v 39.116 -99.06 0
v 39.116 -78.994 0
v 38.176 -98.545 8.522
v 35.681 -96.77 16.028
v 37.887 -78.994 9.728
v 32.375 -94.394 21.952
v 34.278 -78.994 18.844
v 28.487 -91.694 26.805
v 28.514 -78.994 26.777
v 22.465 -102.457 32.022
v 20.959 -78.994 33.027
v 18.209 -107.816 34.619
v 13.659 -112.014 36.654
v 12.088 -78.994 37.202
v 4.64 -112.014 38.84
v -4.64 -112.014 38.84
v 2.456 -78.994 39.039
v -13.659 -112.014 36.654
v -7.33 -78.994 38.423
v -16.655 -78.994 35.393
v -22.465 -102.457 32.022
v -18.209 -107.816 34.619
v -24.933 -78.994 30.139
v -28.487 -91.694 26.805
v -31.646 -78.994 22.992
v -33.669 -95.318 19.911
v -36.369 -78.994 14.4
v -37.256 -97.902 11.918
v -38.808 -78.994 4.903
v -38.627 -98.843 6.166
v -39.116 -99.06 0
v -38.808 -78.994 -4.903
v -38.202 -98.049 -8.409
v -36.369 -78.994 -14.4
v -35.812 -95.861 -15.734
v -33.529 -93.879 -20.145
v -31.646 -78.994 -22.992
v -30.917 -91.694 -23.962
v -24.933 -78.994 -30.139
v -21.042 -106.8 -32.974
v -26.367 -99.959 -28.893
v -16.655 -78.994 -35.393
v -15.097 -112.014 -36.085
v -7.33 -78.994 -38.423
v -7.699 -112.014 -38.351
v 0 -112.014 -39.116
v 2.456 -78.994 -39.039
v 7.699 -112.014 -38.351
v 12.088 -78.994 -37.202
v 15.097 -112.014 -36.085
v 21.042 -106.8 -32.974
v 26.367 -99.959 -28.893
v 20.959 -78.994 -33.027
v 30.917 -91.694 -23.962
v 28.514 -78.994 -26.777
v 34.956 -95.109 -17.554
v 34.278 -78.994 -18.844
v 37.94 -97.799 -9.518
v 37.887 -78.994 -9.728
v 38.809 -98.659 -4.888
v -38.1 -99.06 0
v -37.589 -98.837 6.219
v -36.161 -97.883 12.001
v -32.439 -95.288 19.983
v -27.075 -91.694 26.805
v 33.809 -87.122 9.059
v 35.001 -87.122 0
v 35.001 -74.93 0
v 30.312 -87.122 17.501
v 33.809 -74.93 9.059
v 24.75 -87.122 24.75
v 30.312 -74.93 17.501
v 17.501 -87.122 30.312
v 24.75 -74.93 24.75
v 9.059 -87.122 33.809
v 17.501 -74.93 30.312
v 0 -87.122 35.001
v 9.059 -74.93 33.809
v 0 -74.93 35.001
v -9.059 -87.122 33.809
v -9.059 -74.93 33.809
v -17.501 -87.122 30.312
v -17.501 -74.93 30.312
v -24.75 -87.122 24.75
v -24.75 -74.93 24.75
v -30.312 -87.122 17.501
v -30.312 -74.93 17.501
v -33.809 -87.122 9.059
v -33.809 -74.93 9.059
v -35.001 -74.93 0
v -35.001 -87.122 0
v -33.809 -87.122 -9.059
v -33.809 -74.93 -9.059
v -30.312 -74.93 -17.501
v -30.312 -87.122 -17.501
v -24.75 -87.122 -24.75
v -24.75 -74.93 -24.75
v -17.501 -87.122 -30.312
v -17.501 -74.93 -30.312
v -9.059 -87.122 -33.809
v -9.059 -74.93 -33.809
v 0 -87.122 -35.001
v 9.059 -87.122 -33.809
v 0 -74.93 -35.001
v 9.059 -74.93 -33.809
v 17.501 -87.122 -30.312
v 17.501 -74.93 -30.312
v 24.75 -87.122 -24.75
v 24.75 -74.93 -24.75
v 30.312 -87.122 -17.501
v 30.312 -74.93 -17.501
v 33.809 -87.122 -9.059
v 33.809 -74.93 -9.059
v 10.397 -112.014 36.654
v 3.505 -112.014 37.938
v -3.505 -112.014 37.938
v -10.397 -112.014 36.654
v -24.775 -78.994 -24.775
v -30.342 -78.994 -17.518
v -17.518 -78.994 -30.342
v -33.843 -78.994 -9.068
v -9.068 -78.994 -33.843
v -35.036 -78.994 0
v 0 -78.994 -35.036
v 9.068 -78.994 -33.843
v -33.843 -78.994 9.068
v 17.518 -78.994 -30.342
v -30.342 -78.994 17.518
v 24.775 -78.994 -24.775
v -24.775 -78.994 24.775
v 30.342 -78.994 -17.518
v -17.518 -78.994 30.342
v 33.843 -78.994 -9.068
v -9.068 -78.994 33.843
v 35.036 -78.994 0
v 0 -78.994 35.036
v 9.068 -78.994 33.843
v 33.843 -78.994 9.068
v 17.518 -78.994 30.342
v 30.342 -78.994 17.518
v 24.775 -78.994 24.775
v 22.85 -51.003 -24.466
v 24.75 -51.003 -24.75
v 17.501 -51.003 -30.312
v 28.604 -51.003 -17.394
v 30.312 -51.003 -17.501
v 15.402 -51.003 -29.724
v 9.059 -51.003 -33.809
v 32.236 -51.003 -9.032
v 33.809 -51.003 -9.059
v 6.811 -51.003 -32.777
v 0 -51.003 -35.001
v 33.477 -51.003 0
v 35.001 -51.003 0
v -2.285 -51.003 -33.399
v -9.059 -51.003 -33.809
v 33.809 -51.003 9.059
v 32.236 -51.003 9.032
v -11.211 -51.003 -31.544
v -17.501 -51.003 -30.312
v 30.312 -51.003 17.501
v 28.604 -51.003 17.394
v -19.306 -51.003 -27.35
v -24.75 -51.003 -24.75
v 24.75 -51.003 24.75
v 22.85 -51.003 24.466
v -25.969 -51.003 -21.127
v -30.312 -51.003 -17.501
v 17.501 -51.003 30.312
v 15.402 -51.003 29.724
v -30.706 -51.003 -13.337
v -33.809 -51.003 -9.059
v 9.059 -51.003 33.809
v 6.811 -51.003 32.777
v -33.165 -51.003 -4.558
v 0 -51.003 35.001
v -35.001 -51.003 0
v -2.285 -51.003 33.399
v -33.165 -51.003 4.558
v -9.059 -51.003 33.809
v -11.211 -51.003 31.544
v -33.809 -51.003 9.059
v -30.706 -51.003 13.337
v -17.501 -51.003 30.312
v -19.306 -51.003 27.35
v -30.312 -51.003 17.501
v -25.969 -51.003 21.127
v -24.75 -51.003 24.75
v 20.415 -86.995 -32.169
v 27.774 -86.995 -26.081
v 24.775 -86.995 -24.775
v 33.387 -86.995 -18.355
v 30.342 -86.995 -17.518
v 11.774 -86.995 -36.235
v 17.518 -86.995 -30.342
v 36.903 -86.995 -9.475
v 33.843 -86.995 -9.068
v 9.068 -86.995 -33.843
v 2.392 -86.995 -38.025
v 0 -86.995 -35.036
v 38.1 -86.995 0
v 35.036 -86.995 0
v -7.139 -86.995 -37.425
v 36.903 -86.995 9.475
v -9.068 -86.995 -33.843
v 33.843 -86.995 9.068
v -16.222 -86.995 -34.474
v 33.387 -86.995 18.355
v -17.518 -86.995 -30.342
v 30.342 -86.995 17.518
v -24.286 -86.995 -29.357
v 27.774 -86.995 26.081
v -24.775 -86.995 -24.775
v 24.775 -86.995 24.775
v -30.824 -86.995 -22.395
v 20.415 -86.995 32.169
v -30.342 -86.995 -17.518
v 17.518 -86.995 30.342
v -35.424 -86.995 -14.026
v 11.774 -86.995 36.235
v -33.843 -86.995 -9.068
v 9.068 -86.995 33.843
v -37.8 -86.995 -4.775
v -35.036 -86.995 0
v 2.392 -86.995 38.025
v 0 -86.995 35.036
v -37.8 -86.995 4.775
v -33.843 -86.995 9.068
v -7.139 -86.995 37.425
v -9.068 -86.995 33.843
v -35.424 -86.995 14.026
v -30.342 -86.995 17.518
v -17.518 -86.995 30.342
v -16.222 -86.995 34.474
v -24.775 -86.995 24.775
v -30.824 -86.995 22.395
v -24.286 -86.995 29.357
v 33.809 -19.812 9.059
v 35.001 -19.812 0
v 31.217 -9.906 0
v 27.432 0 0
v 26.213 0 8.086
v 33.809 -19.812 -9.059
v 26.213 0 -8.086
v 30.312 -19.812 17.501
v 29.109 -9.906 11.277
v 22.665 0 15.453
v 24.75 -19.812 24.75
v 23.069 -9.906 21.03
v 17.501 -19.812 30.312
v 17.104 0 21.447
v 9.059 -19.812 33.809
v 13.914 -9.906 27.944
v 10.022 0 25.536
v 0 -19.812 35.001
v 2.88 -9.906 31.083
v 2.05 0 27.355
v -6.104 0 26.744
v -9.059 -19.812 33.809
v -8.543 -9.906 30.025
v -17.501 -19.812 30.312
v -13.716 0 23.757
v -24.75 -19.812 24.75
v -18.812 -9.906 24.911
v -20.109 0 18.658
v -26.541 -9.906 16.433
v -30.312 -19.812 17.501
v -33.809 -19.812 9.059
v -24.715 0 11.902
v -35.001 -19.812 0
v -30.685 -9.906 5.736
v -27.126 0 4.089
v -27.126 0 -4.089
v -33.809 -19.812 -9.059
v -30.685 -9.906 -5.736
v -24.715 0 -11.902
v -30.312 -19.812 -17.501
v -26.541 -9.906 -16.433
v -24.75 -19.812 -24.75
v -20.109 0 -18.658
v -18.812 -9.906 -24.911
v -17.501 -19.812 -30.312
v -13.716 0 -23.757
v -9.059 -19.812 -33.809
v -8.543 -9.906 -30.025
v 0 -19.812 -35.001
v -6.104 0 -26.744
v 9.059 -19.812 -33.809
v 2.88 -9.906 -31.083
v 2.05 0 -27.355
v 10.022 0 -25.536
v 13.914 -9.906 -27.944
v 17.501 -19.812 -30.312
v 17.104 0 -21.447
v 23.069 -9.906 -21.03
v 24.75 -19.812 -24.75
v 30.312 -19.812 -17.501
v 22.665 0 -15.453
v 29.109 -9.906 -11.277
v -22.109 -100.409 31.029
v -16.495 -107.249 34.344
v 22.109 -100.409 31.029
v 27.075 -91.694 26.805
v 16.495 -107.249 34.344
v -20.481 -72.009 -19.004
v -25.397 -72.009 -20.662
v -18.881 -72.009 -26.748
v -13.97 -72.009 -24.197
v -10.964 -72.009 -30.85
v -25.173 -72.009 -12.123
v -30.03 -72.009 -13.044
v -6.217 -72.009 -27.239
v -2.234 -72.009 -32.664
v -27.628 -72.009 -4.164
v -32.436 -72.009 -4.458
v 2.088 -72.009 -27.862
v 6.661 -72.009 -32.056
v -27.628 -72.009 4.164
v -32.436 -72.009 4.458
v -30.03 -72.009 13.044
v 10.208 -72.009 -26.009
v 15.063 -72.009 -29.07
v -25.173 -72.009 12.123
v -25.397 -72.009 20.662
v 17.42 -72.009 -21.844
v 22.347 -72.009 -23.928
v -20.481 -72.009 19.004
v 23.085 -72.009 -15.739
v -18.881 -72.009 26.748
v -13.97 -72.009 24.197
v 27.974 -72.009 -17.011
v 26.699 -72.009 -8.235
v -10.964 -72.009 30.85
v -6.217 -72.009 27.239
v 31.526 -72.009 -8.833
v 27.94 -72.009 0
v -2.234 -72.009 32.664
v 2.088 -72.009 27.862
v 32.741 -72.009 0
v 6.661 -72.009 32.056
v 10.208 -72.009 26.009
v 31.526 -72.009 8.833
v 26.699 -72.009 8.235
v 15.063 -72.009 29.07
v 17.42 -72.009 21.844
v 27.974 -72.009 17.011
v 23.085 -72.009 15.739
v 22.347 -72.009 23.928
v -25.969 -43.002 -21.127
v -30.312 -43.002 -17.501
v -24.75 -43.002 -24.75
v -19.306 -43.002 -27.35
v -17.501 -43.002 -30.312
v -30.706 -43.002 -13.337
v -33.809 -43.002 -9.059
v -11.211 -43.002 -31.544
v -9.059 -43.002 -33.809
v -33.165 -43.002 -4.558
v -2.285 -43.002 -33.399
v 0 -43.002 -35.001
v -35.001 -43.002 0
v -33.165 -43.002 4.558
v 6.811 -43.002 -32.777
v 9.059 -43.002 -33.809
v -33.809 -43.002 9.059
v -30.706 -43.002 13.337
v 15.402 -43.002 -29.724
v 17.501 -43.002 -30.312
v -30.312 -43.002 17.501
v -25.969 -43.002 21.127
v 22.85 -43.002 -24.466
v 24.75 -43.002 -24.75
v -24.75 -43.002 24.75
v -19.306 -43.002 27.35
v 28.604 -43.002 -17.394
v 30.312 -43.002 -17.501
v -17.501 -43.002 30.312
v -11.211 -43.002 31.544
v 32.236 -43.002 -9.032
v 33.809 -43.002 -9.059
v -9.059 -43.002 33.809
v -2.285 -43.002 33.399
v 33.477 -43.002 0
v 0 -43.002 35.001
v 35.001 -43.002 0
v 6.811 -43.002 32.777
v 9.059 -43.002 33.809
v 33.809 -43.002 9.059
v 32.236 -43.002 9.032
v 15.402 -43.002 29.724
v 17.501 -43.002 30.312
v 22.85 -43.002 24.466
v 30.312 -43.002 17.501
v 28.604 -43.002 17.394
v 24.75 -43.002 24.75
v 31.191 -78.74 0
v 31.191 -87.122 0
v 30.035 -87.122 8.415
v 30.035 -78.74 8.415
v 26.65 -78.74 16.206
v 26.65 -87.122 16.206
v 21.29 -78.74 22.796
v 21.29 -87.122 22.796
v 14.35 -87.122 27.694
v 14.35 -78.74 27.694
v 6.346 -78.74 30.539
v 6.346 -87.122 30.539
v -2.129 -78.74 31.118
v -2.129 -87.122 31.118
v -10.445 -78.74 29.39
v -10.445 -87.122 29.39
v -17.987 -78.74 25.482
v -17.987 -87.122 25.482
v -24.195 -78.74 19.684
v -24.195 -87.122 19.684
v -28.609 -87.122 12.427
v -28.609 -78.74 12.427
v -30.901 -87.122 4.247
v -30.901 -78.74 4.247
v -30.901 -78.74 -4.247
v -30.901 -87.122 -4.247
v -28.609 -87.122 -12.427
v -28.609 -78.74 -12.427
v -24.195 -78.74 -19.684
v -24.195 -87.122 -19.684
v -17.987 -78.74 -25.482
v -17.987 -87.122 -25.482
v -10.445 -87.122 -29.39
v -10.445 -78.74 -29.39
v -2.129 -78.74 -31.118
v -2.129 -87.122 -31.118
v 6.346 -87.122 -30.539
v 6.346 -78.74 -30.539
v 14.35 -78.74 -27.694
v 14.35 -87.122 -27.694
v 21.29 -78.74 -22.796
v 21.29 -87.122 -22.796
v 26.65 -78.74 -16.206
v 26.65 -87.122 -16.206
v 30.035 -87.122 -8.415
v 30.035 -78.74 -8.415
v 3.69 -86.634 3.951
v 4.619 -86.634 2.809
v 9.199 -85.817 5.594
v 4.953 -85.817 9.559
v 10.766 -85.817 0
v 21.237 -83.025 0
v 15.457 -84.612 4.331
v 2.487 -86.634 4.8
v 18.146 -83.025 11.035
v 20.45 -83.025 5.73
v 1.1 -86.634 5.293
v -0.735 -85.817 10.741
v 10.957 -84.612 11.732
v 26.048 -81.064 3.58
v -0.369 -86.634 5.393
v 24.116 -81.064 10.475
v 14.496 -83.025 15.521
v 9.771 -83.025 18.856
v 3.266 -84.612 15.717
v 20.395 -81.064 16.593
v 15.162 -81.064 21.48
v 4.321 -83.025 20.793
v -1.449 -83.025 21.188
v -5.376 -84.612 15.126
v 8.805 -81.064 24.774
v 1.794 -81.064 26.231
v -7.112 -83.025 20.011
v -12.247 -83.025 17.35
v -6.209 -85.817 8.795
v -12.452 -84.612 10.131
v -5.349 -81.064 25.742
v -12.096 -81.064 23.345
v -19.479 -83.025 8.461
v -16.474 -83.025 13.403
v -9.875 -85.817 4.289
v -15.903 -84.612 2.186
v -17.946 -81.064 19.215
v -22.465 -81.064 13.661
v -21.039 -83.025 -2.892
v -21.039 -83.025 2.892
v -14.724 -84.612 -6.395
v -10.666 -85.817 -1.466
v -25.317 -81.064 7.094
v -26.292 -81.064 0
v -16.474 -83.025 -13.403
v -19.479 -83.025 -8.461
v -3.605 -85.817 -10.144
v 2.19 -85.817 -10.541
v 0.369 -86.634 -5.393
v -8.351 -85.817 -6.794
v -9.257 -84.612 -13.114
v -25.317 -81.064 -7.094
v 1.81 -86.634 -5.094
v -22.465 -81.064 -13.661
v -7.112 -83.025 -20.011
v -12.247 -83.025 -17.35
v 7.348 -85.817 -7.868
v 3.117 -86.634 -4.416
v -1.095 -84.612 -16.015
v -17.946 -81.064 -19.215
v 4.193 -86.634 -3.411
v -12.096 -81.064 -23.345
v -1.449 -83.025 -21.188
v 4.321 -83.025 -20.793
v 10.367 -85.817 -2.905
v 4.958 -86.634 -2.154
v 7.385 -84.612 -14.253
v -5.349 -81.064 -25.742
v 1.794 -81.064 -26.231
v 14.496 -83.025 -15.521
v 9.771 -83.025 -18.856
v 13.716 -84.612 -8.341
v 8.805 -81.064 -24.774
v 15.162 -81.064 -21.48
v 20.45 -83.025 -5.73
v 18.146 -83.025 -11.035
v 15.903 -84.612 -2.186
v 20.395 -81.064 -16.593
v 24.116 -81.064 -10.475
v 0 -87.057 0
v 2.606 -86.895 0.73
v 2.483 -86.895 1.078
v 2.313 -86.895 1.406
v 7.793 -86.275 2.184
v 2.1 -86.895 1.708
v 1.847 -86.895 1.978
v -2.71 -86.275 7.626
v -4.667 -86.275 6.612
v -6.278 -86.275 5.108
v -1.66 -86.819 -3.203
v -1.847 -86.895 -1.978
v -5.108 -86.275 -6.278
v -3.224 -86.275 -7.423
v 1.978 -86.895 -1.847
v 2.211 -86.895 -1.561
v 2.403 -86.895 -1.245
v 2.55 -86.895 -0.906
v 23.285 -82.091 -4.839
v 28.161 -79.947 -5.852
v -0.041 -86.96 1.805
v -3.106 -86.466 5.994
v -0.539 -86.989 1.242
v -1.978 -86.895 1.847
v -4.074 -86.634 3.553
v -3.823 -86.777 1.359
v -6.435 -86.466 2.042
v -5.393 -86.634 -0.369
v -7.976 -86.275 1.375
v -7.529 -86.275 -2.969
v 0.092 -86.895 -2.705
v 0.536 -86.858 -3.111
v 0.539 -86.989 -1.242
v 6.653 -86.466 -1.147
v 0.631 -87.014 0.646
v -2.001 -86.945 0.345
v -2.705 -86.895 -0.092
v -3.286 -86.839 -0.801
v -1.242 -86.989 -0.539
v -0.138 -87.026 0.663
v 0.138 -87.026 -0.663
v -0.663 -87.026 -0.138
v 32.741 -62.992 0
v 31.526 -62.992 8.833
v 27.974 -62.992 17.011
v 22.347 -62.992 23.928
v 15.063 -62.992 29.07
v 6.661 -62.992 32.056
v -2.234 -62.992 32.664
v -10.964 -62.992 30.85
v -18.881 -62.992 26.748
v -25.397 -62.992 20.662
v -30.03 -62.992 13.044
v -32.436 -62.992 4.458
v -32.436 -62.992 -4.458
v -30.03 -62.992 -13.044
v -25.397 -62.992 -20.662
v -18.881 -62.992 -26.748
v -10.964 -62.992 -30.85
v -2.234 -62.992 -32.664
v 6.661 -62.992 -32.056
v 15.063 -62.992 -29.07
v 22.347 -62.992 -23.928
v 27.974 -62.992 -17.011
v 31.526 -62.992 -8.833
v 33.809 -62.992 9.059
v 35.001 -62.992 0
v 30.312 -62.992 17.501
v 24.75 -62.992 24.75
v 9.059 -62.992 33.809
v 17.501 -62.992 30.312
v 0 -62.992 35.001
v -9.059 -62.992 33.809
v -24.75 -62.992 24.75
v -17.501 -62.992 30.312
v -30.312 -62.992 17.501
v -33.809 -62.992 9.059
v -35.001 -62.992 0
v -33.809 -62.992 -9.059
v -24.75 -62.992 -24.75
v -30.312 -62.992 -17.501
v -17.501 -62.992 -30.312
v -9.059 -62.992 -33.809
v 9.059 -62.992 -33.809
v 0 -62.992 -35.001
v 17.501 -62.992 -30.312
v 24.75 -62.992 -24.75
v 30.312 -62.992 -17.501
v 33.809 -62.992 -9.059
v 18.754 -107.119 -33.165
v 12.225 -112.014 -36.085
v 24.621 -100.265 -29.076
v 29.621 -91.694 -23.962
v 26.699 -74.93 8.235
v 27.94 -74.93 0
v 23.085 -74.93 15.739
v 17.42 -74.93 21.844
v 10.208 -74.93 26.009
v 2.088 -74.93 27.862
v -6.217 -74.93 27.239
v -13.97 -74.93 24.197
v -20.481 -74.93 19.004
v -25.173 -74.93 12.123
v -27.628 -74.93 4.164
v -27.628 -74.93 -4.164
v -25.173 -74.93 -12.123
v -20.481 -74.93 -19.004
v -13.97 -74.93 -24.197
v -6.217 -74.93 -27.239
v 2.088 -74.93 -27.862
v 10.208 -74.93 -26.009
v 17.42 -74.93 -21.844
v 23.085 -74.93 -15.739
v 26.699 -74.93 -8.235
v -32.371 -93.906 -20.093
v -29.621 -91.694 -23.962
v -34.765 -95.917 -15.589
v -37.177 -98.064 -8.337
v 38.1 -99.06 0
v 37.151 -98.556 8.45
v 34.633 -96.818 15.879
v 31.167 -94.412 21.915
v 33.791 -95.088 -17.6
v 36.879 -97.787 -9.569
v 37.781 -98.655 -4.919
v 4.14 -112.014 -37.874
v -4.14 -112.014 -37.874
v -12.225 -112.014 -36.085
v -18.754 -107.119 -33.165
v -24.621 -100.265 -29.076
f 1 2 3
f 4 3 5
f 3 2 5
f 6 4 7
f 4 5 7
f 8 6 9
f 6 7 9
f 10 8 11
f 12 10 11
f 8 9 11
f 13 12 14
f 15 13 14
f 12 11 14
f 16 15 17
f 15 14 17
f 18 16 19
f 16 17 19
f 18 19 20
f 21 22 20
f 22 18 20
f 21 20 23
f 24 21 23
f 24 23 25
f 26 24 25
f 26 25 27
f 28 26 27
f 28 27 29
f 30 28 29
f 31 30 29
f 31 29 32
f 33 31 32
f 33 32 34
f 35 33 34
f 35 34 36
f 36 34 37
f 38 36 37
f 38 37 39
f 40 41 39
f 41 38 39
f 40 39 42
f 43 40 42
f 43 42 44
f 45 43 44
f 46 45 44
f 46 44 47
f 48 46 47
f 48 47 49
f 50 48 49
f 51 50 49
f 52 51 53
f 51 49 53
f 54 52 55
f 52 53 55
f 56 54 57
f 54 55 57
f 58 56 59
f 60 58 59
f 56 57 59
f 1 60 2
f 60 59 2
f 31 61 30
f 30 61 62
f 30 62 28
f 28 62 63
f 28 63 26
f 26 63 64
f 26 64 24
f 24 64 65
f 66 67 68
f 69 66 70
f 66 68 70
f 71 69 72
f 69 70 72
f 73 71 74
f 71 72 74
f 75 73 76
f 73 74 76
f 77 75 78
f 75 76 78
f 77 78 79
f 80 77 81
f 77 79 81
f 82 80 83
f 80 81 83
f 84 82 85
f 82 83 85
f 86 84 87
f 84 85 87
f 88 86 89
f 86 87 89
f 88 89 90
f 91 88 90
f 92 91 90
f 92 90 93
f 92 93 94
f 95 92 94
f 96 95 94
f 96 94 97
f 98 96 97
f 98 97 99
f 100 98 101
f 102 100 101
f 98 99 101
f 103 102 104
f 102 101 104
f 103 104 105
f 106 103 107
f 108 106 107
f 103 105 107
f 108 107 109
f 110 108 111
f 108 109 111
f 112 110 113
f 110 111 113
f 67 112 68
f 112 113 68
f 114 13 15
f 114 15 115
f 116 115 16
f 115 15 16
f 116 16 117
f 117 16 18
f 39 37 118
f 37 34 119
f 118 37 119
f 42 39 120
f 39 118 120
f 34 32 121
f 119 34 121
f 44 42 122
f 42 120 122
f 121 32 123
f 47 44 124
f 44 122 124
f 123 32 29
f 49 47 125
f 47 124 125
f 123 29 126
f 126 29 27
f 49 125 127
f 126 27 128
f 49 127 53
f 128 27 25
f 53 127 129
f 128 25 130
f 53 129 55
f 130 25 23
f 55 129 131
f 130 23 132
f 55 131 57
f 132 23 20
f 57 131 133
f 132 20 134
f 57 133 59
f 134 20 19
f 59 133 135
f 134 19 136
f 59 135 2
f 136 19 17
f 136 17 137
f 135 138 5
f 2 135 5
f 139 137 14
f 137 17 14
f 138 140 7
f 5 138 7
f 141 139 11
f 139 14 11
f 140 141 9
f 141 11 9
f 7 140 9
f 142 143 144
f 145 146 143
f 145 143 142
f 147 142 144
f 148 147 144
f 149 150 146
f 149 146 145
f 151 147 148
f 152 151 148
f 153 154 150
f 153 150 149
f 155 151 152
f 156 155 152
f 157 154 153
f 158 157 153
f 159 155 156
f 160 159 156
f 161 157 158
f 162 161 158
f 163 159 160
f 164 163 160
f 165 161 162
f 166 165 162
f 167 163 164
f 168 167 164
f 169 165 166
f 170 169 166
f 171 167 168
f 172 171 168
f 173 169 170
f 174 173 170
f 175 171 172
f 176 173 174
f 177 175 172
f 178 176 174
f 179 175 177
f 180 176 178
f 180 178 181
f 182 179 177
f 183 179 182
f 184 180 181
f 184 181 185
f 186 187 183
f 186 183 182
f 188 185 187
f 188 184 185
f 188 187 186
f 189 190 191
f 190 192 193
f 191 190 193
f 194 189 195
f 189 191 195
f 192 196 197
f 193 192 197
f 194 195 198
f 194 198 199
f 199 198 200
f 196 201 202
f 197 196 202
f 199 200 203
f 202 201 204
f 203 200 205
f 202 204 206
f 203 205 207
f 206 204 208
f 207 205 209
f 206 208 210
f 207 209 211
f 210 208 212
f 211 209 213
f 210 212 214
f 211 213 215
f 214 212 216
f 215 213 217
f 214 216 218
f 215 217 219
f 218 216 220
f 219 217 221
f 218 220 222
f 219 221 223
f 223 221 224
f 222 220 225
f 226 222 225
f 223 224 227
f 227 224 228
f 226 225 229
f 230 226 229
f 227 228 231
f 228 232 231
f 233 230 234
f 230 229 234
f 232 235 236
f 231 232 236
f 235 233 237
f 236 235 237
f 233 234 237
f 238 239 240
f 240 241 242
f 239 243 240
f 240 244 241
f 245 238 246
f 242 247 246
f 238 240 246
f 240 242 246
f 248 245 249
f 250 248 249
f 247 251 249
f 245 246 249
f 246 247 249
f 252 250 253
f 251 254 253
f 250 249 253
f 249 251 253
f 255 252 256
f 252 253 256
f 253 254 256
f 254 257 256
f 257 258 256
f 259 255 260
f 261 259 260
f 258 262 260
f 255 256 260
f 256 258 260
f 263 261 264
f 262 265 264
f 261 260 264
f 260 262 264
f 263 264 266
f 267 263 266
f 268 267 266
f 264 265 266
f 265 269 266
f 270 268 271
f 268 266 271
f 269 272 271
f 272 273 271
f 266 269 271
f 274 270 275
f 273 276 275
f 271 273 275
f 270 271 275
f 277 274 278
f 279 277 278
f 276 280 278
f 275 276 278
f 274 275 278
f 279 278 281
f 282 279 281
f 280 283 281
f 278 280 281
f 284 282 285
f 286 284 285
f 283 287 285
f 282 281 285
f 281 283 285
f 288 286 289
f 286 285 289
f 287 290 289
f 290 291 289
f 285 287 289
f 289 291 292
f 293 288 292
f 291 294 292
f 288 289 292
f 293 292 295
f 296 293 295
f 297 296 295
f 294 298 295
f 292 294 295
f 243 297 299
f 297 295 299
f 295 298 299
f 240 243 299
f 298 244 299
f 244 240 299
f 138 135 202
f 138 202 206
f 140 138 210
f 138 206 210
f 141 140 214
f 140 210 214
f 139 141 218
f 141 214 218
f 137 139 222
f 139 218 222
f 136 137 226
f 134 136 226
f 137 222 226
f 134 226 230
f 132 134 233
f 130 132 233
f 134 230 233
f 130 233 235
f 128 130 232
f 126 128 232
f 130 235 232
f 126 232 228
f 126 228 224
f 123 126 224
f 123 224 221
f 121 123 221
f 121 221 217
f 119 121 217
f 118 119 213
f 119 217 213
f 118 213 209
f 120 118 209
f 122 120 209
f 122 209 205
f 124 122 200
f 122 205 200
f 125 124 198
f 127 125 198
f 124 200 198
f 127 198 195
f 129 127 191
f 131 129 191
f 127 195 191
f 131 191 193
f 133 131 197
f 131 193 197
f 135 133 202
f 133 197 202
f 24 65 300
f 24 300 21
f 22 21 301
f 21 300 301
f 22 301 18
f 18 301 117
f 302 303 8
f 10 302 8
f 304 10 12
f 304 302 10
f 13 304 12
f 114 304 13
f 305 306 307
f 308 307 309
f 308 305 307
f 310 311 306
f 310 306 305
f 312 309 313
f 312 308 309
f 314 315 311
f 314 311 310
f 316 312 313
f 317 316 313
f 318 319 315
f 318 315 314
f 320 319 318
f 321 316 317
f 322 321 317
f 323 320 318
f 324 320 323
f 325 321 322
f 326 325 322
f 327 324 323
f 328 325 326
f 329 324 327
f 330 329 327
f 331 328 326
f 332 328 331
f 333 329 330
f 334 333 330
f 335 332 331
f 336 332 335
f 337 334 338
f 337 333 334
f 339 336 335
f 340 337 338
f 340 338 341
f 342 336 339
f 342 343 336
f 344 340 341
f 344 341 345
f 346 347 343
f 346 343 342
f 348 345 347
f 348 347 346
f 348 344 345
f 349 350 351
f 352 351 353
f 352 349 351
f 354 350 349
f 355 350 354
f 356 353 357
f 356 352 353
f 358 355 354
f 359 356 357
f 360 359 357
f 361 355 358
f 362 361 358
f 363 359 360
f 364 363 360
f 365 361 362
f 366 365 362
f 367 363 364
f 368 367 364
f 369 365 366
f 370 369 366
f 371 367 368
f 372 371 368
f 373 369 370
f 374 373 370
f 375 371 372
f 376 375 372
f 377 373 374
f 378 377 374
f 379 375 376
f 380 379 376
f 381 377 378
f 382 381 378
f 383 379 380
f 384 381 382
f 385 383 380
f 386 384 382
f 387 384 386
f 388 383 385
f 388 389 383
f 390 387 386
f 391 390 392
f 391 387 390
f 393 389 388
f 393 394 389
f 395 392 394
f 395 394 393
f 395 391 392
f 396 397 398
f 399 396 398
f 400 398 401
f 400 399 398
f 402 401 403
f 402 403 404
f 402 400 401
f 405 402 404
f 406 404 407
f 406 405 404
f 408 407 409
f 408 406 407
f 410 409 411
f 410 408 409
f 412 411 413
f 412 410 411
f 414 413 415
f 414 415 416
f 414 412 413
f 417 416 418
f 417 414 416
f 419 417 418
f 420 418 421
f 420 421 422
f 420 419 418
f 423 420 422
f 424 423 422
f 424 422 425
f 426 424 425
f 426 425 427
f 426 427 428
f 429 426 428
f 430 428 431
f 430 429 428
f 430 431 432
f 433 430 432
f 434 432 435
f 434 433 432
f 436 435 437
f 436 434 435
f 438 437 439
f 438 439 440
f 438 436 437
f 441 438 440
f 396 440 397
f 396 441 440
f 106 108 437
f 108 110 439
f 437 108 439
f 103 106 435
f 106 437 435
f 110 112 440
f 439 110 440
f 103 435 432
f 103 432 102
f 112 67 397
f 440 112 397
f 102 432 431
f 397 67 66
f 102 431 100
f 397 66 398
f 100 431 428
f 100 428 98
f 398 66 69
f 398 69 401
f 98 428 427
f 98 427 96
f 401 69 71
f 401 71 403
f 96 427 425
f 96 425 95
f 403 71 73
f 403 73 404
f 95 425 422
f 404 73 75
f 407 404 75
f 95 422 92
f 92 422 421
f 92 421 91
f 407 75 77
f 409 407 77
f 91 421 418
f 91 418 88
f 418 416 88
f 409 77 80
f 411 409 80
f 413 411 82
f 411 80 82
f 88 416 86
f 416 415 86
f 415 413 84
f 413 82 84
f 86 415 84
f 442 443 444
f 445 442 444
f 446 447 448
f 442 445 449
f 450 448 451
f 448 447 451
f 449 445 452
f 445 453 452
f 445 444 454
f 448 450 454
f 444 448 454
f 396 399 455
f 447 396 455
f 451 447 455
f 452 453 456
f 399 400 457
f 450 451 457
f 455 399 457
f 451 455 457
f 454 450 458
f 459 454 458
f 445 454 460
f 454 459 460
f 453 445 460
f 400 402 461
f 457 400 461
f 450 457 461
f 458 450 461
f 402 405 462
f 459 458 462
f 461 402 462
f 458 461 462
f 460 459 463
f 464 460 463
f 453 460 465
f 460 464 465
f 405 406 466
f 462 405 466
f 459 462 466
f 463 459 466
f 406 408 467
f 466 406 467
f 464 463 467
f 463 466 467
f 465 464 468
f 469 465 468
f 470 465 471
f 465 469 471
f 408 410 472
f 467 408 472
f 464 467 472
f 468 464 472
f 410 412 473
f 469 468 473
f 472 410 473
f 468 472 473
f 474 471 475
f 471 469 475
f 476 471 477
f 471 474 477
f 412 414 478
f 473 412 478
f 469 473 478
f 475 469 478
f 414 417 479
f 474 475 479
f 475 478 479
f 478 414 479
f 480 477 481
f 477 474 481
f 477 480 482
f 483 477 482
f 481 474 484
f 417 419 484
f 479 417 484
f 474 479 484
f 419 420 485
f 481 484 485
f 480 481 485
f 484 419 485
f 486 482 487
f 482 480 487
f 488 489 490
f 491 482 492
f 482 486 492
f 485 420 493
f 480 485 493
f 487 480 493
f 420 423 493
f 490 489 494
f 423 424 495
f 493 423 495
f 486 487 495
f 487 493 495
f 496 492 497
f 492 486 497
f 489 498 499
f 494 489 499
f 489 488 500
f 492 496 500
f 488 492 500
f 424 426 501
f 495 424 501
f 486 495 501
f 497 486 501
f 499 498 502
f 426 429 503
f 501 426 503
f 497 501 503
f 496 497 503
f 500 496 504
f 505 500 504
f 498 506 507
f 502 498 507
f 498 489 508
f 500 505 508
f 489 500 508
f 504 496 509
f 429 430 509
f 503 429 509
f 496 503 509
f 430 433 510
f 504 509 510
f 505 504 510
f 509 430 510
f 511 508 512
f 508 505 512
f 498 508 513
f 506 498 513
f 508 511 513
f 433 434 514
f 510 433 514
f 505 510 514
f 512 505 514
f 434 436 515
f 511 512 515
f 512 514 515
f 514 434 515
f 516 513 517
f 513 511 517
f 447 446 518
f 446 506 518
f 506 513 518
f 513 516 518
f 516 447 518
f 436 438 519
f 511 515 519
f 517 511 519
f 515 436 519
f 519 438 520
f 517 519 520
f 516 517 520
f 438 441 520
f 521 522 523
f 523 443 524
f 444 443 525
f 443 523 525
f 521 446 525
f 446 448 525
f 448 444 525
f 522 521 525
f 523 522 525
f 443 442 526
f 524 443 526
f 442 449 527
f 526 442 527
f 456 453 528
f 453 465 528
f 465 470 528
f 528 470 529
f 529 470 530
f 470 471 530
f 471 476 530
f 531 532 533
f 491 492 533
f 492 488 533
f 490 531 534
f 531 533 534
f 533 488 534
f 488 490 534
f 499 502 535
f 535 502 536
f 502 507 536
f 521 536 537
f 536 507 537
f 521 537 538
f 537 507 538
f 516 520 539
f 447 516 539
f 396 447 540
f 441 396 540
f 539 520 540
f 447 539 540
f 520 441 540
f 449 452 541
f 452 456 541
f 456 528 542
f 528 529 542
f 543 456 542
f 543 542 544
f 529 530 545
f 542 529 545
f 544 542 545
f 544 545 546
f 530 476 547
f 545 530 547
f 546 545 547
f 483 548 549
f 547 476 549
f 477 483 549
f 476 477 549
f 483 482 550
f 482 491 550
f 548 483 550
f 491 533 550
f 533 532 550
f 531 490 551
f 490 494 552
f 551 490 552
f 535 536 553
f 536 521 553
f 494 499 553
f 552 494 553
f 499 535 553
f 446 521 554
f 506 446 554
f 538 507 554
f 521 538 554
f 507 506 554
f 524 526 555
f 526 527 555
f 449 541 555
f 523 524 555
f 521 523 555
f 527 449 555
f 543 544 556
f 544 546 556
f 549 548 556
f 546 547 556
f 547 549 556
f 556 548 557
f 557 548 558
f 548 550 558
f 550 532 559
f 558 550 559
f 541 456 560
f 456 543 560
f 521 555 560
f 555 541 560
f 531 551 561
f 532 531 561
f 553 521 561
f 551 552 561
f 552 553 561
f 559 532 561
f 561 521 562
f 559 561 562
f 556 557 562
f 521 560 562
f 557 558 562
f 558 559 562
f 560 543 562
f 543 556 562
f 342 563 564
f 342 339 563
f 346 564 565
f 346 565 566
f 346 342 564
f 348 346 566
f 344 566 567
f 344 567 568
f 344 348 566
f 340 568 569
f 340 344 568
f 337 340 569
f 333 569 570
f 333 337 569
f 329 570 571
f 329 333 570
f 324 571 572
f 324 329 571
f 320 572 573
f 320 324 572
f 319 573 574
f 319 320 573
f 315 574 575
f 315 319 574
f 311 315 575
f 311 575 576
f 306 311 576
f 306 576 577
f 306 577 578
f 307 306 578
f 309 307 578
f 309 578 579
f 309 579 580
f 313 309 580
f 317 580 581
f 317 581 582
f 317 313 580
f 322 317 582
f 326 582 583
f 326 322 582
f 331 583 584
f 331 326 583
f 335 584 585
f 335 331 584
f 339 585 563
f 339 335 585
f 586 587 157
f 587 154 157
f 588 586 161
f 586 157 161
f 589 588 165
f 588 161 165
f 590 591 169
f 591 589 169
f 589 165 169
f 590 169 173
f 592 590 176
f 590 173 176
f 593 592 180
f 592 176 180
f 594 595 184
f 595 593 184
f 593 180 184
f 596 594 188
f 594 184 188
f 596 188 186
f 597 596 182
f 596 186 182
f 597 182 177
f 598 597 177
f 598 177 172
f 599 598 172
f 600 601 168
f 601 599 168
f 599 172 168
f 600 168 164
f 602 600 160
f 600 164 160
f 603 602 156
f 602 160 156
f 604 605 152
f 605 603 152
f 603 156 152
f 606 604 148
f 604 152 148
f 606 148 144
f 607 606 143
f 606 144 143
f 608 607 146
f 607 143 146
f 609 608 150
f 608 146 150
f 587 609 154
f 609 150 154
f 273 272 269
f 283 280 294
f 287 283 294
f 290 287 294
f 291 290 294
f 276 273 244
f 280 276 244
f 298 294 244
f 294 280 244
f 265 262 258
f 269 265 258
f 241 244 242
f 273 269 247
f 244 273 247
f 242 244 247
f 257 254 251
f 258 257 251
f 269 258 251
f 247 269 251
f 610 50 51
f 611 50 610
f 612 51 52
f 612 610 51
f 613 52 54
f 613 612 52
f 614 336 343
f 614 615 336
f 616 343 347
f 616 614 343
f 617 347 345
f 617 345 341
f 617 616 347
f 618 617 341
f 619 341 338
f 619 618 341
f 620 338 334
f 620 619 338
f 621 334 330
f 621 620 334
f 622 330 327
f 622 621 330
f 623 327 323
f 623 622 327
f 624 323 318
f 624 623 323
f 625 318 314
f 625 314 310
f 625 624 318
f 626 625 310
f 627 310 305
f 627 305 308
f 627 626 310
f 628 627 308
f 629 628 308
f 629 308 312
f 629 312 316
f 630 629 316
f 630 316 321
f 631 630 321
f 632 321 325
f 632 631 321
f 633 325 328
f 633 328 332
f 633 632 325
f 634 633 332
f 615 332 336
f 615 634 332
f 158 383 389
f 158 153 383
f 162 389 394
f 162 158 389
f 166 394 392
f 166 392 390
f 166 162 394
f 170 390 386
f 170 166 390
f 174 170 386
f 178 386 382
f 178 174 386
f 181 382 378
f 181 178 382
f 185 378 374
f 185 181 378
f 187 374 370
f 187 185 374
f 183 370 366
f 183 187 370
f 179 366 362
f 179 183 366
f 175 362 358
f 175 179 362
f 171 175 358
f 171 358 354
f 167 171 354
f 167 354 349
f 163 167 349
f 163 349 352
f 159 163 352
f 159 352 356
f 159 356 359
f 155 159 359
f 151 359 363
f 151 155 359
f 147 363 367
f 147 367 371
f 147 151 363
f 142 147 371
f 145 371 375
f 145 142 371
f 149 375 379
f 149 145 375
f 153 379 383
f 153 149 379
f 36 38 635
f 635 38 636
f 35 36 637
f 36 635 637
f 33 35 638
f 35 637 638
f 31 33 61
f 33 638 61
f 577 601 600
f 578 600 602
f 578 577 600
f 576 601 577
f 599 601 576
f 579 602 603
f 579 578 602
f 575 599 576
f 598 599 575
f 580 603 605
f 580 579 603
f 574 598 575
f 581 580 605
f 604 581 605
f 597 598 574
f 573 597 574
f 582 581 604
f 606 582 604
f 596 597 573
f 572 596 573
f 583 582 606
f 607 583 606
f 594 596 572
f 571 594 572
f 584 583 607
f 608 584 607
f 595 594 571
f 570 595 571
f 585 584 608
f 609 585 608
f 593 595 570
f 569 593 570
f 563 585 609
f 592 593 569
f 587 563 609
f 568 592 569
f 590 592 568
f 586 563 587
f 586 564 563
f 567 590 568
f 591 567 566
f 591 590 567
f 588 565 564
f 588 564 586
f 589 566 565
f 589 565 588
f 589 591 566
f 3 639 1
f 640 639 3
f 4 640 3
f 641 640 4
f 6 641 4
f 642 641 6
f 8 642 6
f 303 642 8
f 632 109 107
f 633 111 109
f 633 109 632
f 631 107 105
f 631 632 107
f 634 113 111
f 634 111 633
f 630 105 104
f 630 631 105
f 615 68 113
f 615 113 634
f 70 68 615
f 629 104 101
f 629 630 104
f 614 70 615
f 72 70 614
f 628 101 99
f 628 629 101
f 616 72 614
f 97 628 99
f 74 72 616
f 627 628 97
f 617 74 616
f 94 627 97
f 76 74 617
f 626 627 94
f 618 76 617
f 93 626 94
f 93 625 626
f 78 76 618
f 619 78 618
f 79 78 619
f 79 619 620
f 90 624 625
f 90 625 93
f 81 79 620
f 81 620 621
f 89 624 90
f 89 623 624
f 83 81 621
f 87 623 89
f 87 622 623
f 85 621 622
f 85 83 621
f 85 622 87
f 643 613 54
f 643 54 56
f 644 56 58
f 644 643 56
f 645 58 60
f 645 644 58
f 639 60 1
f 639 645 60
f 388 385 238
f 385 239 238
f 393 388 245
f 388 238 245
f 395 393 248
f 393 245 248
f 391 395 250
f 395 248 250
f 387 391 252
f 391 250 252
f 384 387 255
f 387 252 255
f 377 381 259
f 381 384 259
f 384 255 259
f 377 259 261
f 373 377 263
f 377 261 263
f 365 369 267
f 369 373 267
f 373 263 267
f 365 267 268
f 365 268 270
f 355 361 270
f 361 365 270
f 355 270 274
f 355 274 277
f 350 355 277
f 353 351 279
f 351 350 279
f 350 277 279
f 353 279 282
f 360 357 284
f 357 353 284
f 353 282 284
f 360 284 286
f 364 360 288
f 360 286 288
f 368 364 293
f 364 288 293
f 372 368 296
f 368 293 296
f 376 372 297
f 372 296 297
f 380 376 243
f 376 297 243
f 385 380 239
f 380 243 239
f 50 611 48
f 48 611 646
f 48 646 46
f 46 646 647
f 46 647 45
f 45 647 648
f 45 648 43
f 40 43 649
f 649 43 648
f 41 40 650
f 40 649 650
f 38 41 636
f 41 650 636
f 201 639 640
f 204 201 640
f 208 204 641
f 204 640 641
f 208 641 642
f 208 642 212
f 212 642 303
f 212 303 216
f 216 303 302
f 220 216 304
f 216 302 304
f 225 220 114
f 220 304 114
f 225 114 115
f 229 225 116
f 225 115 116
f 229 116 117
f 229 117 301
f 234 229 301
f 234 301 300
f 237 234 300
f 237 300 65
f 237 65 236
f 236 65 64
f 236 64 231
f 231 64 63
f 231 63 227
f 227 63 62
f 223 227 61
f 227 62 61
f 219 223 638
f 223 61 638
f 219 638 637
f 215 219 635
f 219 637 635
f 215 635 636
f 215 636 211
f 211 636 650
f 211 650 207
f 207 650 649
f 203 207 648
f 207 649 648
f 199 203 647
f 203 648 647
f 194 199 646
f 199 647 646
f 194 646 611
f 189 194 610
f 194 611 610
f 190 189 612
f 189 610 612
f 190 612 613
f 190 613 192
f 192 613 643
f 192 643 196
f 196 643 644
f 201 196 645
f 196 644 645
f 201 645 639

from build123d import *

# Parameters (mm, degrees)
F0_W          = 3.81
F0_H          = 8.382
F4_DEPTH      = 50.8
F4_DEPTH_BACK = 50.8
F5_W          = 11.241811163
F5_H          = 11.9888


with BuildPart() as f2:
    # F0 (on Top) → F2 (revolve)
    with BuildSketch(Plane.XY):
        Polygon((27.432, 0), (0, 0), (0, -19.812), (35.0012, -19.812), align=None)
        with BuildLine():
            Line((35.0012, -19.812), (0, -19.812))
            Line((0, -19.812), (0, -87.0573774754))
            ThreePointArc((0, -87.0573774754), (16.0525781065, -84.6124134733), (31.1912, -78.74))
            Line((31.1912, -78.74), (35.0012, -78.74))
            Line((35.0012, -78.74), (35.0012, -19.812))
        make_face()
        with Locations((33.0962, -82.931)):
            Rectangle(F0_W, F0_H)
    revolve(axis=Axis((0, -75.0442962162, 0), (0, -1, 0)))

    # F5 (on Top) → F6 (revolve, cut)
    with BuildSketch(Plane.XY):
        Polygon((35.5092, -62.992), (32.7406, -62.992), (32.7406, -72.009), (46.751011163, -72.009), (46.751011163, -62.992), align=None)
        with Locations((41.1301055815, -56.9976)):
            Rectangle(F5_W, F5_H)
        Polygon((46.751011163, -72.009), (32.7406, -72.009), (27.94, -72.009), (27.94, -74.93), (46.751011163, -74.93), align=None)
        Polygon((33.4772, -51.0032), (35.5092, -51.0032), (46.751011163, -51.0032), (46.751011163, -43.0022), (33.4772, -43.0022), align=None)
    revolve(axis=Axis((0, -65.7451344887, 0), (0, -1, 0)), mode=Mode.SUBTRACT)


with BuildPart() as f2b:
    # F1 (on Top) → F2, piece 2 (revolve)
    with BuildSketch(Plane.XY):
        Polygon((38.1, -86.995), (38.1, -112.014), (39.116, -112.014), (39.116, -78.994), (35.0364409387, -78.994), (35.0364409387, -86.995), align=None)
    revolve(axis=Axis((0, -75.0442962162, 0), (0, -1, 0)))

    # F3 (on Right) → F4 (cut, two sides)
    with BuildSketch(Plane.YZ) as f4_sk:
        with BuildLine():
            ThreePointArc((-91.694, -23.9623859525), (-96.9932331589, -12.4780205239), (-99.06, 0))
            Line((-99.06, 0), (-117.094, 0))
            Line((-117.094, 0), (-117.094, -39.116))
            Line((-117.094, -39.116), (-91.694, -23.9623859525))
        make_face()
        with BuildLine():
            Line((-117.094, 0), (-99.06, 0))
            ThreePointArc((-99.06, 0), (-97.3904909234, 13.9559885826), (-91.694, 26.8053803593))
            Line((-91.694, 26.8053803593), (-117.094, 39.116))
            Line((-117.094, 39.116), (-117.094, 0))
        make_face()
    extrude(amount=-F4_DEPTH, mode=Mode.SUBTRACT)
    extrude(f4_sk.sketch, amount=F4_DEPTH_BACK, mode=Mode.SUBTRACT)


solid = Compound([f2.part, f2b.part])
